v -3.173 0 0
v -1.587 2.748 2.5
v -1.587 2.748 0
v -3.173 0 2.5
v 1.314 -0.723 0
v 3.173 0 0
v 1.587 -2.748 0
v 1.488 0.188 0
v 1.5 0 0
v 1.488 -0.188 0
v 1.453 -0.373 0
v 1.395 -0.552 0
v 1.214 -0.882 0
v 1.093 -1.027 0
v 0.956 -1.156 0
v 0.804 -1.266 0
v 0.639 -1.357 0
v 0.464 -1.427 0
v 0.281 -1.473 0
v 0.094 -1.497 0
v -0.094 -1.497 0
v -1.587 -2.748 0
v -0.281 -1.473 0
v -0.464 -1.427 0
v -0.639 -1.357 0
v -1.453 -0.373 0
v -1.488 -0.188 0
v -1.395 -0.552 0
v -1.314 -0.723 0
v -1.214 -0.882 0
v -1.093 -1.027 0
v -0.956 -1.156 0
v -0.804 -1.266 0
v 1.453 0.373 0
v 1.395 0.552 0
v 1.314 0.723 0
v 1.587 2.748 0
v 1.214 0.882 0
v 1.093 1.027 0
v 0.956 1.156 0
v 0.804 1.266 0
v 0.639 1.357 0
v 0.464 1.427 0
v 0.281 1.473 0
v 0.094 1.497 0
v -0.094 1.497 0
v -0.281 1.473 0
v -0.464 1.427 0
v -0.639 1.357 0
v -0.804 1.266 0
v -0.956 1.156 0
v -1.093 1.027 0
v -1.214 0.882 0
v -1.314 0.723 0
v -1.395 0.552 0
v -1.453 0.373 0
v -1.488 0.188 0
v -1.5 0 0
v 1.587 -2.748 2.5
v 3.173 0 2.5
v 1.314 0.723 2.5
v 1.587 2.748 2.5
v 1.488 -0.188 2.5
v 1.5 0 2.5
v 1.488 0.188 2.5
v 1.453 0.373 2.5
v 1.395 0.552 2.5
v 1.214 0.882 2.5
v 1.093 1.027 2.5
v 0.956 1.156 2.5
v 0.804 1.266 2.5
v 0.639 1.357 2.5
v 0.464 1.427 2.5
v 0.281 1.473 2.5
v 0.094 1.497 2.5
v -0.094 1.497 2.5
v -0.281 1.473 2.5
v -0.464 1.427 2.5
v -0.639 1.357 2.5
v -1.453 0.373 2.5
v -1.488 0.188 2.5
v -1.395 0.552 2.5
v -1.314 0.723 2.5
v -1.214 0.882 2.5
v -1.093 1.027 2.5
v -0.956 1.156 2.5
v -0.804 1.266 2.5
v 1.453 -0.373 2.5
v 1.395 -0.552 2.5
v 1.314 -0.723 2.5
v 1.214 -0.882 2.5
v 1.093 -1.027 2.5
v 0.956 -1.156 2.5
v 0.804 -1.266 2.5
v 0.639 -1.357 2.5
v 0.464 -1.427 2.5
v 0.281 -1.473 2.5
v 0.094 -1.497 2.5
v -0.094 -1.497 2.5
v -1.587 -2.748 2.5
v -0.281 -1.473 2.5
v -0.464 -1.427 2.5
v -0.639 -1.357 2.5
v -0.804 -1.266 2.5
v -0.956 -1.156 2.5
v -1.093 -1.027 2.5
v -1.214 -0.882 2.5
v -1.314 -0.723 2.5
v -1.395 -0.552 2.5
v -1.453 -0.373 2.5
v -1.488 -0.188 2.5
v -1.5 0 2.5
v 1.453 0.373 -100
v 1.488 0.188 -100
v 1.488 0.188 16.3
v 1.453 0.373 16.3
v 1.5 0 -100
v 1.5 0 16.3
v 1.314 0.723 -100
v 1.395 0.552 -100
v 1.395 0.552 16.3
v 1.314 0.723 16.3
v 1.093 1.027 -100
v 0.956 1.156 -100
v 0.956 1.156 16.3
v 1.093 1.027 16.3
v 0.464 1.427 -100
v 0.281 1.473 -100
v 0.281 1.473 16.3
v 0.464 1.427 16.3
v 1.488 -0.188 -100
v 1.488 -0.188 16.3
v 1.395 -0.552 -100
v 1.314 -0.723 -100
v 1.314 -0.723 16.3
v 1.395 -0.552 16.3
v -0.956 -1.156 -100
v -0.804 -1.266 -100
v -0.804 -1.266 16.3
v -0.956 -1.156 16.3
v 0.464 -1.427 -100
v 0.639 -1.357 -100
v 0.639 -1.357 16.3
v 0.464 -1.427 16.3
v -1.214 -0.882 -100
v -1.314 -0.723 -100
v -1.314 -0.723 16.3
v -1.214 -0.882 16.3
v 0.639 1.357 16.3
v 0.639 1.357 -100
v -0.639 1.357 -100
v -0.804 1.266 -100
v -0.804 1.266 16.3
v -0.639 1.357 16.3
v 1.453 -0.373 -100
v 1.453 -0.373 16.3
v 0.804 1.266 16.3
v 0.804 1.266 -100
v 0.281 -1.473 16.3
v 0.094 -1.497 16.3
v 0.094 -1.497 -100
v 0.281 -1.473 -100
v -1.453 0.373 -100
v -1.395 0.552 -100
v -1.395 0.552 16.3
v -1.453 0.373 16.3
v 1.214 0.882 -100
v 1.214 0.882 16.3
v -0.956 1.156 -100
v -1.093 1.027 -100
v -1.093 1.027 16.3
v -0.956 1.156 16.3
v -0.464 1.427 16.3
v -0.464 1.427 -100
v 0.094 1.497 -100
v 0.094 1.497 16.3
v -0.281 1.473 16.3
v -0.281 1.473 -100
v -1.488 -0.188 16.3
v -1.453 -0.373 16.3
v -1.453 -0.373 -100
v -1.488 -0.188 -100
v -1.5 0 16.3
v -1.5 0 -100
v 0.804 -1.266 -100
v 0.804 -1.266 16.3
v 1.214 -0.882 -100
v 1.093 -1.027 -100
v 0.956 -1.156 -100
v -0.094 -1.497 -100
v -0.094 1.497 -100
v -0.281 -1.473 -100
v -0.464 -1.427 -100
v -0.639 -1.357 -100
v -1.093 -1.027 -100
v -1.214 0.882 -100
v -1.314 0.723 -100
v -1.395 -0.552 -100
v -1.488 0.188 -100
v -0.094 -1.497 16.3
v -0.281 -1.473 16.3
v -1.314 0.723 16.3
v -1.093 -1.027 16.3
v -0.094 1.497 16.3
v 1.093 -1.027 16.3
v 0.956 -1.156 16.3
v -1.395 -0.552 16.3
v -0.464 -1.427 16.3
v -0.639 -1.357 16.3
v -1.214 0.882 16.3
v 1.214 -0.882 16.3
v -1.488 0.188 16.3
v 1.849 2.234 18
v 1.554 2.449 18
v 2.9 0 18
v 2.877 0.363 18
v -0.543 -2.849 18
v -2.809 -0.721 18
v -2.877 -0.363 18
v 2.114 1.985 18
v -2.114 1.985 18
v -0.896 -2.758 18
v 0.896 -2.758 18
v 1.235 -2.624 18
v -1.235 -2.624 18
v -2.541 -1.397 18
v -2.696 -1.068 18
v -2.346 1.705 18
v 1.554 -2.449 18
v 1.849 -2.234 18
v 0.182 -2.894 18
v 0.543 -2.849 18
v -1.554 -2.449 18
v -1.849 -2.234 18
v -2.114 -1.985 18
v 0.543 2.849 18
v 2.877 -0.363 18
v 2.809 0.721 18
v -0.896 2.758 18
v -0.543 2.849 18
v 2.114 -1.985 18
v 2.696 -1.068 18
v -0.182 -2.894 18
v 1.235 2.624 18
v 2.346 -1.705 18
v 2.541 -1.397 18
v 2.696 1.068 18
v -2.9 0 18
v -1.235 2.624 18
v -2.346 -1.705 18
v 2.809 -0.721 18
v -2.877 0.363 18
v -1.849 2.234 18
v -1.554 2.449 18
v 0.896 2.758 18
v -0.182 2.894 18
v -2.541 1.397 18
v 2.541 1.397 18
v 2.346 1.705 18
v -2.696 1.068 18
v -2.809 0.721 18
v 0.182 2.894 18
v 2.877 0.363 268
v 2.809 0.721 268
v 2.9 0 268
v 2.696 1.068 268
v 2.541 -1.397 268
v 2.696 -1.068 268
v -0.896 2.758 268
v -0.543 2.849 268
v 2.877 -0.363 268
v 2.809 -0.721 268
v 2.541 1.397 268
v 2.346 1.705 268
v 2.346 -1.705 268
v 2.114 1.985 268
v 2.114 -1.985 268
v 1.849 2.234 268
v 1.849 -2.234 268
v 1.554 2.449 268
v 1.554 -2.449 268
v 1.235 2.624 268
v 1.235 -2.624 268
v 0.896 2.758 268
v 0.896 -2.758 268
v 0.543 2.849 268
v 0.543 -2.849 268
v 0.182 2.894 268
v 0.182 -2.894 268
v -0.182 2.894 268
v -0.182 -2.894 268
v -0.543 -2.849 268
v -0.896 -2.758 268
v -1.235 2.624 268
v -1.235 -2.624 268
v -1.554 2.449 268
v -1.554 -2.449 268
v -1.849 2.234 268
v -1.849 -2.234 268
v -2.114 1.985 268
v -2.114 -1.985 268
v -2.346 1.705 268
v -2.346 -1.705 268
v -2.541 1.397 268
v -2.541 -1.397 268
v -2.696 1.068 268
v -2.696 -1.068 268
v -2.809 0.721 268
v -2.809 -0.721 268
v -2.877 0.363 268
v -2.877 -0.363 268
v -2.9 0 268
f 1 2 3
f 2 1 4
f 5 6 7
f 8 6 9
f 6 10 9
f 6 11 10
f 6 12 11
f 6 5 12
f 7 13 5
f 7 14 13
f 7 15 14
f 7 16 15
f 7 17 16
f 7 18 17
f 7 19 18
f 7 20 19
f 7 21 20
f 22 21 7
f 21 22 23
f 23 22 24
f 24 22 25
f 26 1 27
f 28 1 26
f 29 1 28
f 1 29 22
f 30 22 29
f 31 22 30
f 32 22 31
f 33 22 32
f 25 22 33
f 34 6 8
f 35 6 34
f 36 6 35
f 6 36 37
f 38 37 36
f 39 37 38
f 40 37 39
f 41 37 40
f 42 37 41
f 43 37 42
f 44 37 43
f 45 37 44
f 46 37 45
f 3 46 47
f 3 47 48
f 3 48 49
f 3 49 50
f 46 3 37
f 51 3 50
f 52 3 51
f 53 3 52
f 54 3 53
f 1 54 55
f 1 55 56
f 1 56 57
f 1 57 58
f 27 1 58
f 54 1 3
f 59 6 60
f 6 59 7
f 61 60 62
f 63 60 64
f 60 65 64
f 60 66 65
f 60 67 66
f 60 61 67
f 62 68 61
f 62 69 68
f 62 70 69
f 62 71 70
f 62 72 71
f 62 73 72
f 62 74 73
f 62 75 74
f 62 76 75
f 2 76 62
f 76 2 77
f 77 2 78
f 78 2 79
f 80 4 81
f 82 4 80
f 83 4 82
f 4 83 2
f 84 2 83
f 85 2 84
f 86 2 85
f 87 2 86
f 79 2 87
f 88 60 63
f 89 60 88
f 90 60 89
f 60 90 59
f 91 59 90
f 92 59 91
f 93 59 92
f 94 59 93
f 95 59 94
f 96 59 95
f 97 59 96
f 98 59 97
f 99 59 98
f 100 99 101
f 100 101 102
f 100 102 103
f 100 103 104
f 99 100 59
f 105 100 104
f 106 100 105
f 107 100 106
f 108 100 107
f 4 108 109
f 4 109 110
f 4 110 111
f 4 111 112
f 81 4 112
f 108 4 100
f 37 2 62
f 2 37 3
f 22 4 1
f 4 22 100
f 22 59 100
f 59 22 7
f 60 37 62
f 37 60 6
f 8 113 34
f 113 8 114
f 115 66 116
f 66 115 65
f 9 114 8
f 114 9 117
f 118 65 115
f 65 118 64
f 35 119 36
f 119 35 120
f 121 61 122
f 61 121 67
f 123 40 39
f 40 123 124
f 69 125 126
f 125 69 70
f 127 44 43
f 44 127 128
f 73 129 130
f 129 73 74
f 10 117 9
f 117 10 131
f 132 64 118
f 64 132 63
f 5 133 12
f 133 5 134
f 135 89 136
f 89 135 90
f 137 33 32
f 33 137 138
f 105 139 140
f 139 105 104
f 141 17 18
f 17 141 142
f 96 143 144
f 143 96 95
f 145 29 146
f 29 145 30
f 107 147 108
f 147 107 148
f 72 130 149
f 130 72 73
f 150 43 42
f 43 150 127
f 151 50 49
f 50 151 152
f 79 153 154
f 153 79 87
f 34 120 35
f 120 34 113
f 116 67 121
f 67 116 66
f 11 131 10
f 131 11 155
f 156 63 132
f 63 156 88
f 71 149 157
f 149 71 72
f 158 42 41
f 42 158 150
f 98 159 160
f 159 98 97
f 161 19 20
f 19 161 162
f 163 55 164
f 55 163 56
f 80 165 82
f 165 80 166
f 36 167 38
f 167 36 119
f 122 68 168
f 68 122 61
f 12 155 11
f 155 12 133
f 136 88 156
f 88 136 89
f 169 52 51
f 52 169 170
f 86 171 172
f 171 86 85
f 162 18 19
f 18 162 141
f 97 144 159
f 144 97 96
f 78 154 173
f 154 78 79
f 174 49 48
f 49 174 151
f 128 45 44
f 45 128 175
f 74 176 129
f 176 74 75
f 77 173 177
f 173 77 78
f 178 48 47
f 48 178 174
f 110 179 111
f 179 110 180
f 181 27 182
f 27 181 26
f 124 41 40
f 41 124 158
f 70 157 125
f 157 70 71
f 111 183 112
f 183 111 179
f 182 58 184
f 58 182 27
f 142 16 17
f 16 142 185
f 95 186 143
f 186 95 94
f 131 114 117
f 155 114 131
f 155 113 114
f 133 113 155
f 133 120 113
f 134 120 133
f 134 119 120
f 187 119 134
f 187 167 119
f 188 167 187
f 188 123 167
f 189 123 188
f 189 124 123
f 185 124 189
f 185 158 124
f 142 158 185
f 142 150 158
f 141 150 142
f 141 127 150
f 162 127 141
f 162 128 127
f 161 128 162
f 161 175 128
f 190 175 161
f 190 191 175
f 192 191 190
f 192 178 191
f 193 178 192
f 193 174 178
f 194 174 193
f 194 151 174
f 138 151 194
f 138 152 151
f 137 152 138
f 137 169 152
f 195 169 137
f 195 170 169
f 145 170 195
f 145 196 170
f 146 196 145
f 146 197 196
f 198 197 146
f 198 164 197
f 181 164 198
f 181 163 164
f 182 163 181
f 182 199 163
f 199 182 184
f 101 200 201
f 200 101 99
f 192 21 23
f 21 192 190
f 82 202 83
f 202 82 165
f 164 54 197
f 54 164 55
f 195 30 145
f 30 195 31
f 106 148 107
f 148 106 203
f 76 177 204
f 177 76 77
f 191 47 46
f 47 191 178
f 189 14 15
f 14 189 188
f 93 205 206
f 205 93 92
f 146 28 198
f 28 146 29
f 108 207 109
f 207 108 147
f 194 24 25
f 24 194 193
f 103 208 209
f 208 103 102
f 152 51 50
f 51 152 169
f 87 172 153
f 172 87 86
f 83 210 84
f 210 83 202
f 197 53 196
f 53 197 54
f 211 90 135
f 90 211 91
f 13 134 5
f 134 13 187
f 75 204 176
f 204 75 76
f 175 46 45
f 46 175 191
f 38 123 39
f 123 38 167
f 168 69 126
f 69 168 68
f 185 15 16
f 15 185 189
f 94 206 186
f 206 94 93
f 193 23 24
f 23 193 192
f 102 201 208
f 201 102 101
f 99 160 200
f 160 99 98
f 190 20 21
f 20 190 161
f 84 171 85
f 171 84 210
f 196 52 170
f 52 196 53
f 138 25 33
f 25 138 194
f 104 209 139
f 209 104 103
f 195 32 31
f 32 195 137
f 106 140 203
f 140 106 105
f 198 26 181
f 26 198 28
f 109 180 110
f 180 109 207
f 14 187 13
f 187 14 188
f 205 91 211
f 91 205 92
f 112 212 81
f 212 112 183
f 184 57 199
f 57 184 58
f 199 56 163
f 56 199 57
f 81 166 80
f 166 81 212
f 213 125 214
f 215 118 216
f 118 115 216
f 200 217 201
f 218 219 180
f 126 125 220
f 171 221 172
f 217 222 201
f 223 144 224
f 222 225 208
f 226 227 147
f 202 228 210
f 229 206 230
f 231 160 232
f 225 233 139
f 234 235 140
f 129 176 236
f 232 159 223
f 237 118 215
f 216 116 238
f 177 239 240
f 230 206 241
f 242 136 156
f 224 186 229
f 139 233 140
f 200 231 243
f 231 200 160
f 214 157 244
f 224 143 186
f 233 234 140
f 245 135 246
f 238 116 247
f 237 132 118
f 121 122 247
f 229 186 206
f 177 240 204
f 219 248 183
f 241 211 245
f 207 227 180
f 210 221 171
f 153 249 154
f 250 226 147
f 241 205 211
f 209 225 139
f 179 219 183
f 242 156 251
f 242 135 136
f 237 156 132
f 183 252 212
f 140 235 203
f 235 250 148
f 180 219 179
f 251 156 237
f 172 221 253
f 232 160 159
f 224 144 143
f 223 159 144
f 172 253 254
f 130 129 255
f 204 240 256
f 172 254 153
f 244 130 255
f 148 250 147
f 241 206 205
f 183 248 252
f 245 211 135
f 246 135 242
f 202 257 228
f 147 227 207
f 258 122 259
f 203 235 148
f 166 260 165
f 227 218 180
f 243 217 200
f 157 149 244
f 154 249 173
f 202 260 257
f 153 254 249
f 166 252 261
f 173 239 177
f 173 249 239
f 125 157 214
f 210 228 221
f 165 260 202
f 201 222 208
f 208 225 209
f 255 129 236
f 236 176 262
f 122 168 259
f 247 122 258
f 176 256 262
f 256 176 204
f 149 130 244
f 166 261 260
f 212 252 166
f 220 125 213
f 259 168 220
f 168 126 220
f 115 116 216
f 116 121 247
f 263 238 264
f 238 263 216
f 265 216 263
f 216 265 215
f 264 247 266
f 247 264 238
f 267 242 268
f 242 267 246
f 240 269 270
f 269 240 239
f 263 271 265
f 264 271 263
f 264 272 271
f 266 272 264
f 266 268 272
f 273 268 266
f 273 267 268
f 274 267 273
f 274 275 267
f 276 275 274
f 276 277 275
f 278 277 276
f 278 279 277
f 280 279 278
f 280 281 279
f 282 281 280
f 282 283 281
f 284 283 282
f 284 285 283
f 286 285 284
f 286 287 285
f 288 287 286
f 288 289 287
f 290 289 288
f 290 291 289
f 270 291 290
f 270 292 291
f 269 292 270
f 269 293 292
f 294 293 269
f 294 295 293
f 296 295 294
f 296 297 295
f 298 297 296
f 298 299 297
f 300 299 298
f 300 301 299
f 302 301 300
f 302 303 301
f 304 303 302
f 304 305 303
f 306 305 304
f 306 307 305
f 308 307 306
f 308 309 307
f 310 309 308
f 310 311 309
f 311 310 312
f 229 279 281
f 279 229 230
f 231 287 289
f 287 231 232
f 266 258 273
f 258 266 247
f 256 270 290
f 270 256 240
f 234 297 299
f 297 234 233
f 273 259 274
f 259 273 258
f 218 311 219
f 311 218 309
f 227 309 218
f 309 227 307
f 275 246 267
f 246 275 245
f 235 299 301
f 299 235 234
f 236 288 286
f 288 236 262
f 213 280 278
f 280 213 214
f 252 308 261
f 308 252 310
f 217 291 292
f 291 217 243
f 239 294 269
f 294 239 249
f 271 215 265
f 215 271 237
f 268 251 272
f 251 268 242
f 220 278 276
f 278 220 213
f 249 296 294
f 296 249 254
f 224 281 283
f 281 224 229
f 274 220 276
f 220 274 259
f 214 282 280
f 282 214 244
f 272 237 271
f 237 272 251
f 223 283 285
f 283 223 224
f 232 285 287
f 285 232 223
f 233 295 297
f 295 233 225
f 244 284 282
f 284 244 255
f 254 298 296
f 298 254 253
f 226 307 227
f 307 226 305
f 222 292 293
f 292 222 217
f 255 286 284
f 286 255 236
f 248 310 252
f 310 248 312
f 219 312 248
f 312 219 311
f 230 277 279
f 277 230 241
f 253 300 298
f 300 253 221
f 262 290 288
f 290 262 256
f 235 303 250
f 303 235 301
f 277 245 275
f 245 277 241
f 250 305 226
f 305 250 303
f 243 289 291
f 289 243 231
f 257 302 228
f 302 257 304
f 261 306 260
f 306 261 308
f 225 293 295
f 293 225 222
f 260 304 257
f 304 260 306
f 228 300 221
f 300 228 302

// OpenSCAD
$fn = 50;

difference() {
	union() {
		translate(v = [0, 0, 18.0]) {
			rotate(a = [0, 0, 0]) {
				difference() {
					union() {
						translate(v = [0, 0, -18.0]) {
							rotate(a = [0, 0, 0]) {
								difference() {
									union() {
										linear_extrude(height = 2.5) {
											polygon(points = [[3.1734999999999998, 0.0], [1.5867500000000003, 2.7483316189099156], [-1.5867499999999992, 2.748331618909916], [-3.1734999999999998, 3.886416617094125e-16], [-1.5867500000000012, -2.748331618909915], [1.5867499999999977, -2.748331618909917]]);
										}
										translate(v = [0, 0, -100.0]) {
											cylinder(h = 200, r = 1.5);
										}
									}
									union();
								}
							}
						}
						translate(v = [0, 0, -1.7]) {
							cylinder(h = 1.7, r1 = 1.5, r2 = 2.9);
						}
						cylinder(h = 250, r = 2.9);
						translate(v = [0, 0, -18.0]) {
							cylinder(h = 18, r = 1.5);
						}
					}
					union();
				}
			}
		}
	}
	union();
}
